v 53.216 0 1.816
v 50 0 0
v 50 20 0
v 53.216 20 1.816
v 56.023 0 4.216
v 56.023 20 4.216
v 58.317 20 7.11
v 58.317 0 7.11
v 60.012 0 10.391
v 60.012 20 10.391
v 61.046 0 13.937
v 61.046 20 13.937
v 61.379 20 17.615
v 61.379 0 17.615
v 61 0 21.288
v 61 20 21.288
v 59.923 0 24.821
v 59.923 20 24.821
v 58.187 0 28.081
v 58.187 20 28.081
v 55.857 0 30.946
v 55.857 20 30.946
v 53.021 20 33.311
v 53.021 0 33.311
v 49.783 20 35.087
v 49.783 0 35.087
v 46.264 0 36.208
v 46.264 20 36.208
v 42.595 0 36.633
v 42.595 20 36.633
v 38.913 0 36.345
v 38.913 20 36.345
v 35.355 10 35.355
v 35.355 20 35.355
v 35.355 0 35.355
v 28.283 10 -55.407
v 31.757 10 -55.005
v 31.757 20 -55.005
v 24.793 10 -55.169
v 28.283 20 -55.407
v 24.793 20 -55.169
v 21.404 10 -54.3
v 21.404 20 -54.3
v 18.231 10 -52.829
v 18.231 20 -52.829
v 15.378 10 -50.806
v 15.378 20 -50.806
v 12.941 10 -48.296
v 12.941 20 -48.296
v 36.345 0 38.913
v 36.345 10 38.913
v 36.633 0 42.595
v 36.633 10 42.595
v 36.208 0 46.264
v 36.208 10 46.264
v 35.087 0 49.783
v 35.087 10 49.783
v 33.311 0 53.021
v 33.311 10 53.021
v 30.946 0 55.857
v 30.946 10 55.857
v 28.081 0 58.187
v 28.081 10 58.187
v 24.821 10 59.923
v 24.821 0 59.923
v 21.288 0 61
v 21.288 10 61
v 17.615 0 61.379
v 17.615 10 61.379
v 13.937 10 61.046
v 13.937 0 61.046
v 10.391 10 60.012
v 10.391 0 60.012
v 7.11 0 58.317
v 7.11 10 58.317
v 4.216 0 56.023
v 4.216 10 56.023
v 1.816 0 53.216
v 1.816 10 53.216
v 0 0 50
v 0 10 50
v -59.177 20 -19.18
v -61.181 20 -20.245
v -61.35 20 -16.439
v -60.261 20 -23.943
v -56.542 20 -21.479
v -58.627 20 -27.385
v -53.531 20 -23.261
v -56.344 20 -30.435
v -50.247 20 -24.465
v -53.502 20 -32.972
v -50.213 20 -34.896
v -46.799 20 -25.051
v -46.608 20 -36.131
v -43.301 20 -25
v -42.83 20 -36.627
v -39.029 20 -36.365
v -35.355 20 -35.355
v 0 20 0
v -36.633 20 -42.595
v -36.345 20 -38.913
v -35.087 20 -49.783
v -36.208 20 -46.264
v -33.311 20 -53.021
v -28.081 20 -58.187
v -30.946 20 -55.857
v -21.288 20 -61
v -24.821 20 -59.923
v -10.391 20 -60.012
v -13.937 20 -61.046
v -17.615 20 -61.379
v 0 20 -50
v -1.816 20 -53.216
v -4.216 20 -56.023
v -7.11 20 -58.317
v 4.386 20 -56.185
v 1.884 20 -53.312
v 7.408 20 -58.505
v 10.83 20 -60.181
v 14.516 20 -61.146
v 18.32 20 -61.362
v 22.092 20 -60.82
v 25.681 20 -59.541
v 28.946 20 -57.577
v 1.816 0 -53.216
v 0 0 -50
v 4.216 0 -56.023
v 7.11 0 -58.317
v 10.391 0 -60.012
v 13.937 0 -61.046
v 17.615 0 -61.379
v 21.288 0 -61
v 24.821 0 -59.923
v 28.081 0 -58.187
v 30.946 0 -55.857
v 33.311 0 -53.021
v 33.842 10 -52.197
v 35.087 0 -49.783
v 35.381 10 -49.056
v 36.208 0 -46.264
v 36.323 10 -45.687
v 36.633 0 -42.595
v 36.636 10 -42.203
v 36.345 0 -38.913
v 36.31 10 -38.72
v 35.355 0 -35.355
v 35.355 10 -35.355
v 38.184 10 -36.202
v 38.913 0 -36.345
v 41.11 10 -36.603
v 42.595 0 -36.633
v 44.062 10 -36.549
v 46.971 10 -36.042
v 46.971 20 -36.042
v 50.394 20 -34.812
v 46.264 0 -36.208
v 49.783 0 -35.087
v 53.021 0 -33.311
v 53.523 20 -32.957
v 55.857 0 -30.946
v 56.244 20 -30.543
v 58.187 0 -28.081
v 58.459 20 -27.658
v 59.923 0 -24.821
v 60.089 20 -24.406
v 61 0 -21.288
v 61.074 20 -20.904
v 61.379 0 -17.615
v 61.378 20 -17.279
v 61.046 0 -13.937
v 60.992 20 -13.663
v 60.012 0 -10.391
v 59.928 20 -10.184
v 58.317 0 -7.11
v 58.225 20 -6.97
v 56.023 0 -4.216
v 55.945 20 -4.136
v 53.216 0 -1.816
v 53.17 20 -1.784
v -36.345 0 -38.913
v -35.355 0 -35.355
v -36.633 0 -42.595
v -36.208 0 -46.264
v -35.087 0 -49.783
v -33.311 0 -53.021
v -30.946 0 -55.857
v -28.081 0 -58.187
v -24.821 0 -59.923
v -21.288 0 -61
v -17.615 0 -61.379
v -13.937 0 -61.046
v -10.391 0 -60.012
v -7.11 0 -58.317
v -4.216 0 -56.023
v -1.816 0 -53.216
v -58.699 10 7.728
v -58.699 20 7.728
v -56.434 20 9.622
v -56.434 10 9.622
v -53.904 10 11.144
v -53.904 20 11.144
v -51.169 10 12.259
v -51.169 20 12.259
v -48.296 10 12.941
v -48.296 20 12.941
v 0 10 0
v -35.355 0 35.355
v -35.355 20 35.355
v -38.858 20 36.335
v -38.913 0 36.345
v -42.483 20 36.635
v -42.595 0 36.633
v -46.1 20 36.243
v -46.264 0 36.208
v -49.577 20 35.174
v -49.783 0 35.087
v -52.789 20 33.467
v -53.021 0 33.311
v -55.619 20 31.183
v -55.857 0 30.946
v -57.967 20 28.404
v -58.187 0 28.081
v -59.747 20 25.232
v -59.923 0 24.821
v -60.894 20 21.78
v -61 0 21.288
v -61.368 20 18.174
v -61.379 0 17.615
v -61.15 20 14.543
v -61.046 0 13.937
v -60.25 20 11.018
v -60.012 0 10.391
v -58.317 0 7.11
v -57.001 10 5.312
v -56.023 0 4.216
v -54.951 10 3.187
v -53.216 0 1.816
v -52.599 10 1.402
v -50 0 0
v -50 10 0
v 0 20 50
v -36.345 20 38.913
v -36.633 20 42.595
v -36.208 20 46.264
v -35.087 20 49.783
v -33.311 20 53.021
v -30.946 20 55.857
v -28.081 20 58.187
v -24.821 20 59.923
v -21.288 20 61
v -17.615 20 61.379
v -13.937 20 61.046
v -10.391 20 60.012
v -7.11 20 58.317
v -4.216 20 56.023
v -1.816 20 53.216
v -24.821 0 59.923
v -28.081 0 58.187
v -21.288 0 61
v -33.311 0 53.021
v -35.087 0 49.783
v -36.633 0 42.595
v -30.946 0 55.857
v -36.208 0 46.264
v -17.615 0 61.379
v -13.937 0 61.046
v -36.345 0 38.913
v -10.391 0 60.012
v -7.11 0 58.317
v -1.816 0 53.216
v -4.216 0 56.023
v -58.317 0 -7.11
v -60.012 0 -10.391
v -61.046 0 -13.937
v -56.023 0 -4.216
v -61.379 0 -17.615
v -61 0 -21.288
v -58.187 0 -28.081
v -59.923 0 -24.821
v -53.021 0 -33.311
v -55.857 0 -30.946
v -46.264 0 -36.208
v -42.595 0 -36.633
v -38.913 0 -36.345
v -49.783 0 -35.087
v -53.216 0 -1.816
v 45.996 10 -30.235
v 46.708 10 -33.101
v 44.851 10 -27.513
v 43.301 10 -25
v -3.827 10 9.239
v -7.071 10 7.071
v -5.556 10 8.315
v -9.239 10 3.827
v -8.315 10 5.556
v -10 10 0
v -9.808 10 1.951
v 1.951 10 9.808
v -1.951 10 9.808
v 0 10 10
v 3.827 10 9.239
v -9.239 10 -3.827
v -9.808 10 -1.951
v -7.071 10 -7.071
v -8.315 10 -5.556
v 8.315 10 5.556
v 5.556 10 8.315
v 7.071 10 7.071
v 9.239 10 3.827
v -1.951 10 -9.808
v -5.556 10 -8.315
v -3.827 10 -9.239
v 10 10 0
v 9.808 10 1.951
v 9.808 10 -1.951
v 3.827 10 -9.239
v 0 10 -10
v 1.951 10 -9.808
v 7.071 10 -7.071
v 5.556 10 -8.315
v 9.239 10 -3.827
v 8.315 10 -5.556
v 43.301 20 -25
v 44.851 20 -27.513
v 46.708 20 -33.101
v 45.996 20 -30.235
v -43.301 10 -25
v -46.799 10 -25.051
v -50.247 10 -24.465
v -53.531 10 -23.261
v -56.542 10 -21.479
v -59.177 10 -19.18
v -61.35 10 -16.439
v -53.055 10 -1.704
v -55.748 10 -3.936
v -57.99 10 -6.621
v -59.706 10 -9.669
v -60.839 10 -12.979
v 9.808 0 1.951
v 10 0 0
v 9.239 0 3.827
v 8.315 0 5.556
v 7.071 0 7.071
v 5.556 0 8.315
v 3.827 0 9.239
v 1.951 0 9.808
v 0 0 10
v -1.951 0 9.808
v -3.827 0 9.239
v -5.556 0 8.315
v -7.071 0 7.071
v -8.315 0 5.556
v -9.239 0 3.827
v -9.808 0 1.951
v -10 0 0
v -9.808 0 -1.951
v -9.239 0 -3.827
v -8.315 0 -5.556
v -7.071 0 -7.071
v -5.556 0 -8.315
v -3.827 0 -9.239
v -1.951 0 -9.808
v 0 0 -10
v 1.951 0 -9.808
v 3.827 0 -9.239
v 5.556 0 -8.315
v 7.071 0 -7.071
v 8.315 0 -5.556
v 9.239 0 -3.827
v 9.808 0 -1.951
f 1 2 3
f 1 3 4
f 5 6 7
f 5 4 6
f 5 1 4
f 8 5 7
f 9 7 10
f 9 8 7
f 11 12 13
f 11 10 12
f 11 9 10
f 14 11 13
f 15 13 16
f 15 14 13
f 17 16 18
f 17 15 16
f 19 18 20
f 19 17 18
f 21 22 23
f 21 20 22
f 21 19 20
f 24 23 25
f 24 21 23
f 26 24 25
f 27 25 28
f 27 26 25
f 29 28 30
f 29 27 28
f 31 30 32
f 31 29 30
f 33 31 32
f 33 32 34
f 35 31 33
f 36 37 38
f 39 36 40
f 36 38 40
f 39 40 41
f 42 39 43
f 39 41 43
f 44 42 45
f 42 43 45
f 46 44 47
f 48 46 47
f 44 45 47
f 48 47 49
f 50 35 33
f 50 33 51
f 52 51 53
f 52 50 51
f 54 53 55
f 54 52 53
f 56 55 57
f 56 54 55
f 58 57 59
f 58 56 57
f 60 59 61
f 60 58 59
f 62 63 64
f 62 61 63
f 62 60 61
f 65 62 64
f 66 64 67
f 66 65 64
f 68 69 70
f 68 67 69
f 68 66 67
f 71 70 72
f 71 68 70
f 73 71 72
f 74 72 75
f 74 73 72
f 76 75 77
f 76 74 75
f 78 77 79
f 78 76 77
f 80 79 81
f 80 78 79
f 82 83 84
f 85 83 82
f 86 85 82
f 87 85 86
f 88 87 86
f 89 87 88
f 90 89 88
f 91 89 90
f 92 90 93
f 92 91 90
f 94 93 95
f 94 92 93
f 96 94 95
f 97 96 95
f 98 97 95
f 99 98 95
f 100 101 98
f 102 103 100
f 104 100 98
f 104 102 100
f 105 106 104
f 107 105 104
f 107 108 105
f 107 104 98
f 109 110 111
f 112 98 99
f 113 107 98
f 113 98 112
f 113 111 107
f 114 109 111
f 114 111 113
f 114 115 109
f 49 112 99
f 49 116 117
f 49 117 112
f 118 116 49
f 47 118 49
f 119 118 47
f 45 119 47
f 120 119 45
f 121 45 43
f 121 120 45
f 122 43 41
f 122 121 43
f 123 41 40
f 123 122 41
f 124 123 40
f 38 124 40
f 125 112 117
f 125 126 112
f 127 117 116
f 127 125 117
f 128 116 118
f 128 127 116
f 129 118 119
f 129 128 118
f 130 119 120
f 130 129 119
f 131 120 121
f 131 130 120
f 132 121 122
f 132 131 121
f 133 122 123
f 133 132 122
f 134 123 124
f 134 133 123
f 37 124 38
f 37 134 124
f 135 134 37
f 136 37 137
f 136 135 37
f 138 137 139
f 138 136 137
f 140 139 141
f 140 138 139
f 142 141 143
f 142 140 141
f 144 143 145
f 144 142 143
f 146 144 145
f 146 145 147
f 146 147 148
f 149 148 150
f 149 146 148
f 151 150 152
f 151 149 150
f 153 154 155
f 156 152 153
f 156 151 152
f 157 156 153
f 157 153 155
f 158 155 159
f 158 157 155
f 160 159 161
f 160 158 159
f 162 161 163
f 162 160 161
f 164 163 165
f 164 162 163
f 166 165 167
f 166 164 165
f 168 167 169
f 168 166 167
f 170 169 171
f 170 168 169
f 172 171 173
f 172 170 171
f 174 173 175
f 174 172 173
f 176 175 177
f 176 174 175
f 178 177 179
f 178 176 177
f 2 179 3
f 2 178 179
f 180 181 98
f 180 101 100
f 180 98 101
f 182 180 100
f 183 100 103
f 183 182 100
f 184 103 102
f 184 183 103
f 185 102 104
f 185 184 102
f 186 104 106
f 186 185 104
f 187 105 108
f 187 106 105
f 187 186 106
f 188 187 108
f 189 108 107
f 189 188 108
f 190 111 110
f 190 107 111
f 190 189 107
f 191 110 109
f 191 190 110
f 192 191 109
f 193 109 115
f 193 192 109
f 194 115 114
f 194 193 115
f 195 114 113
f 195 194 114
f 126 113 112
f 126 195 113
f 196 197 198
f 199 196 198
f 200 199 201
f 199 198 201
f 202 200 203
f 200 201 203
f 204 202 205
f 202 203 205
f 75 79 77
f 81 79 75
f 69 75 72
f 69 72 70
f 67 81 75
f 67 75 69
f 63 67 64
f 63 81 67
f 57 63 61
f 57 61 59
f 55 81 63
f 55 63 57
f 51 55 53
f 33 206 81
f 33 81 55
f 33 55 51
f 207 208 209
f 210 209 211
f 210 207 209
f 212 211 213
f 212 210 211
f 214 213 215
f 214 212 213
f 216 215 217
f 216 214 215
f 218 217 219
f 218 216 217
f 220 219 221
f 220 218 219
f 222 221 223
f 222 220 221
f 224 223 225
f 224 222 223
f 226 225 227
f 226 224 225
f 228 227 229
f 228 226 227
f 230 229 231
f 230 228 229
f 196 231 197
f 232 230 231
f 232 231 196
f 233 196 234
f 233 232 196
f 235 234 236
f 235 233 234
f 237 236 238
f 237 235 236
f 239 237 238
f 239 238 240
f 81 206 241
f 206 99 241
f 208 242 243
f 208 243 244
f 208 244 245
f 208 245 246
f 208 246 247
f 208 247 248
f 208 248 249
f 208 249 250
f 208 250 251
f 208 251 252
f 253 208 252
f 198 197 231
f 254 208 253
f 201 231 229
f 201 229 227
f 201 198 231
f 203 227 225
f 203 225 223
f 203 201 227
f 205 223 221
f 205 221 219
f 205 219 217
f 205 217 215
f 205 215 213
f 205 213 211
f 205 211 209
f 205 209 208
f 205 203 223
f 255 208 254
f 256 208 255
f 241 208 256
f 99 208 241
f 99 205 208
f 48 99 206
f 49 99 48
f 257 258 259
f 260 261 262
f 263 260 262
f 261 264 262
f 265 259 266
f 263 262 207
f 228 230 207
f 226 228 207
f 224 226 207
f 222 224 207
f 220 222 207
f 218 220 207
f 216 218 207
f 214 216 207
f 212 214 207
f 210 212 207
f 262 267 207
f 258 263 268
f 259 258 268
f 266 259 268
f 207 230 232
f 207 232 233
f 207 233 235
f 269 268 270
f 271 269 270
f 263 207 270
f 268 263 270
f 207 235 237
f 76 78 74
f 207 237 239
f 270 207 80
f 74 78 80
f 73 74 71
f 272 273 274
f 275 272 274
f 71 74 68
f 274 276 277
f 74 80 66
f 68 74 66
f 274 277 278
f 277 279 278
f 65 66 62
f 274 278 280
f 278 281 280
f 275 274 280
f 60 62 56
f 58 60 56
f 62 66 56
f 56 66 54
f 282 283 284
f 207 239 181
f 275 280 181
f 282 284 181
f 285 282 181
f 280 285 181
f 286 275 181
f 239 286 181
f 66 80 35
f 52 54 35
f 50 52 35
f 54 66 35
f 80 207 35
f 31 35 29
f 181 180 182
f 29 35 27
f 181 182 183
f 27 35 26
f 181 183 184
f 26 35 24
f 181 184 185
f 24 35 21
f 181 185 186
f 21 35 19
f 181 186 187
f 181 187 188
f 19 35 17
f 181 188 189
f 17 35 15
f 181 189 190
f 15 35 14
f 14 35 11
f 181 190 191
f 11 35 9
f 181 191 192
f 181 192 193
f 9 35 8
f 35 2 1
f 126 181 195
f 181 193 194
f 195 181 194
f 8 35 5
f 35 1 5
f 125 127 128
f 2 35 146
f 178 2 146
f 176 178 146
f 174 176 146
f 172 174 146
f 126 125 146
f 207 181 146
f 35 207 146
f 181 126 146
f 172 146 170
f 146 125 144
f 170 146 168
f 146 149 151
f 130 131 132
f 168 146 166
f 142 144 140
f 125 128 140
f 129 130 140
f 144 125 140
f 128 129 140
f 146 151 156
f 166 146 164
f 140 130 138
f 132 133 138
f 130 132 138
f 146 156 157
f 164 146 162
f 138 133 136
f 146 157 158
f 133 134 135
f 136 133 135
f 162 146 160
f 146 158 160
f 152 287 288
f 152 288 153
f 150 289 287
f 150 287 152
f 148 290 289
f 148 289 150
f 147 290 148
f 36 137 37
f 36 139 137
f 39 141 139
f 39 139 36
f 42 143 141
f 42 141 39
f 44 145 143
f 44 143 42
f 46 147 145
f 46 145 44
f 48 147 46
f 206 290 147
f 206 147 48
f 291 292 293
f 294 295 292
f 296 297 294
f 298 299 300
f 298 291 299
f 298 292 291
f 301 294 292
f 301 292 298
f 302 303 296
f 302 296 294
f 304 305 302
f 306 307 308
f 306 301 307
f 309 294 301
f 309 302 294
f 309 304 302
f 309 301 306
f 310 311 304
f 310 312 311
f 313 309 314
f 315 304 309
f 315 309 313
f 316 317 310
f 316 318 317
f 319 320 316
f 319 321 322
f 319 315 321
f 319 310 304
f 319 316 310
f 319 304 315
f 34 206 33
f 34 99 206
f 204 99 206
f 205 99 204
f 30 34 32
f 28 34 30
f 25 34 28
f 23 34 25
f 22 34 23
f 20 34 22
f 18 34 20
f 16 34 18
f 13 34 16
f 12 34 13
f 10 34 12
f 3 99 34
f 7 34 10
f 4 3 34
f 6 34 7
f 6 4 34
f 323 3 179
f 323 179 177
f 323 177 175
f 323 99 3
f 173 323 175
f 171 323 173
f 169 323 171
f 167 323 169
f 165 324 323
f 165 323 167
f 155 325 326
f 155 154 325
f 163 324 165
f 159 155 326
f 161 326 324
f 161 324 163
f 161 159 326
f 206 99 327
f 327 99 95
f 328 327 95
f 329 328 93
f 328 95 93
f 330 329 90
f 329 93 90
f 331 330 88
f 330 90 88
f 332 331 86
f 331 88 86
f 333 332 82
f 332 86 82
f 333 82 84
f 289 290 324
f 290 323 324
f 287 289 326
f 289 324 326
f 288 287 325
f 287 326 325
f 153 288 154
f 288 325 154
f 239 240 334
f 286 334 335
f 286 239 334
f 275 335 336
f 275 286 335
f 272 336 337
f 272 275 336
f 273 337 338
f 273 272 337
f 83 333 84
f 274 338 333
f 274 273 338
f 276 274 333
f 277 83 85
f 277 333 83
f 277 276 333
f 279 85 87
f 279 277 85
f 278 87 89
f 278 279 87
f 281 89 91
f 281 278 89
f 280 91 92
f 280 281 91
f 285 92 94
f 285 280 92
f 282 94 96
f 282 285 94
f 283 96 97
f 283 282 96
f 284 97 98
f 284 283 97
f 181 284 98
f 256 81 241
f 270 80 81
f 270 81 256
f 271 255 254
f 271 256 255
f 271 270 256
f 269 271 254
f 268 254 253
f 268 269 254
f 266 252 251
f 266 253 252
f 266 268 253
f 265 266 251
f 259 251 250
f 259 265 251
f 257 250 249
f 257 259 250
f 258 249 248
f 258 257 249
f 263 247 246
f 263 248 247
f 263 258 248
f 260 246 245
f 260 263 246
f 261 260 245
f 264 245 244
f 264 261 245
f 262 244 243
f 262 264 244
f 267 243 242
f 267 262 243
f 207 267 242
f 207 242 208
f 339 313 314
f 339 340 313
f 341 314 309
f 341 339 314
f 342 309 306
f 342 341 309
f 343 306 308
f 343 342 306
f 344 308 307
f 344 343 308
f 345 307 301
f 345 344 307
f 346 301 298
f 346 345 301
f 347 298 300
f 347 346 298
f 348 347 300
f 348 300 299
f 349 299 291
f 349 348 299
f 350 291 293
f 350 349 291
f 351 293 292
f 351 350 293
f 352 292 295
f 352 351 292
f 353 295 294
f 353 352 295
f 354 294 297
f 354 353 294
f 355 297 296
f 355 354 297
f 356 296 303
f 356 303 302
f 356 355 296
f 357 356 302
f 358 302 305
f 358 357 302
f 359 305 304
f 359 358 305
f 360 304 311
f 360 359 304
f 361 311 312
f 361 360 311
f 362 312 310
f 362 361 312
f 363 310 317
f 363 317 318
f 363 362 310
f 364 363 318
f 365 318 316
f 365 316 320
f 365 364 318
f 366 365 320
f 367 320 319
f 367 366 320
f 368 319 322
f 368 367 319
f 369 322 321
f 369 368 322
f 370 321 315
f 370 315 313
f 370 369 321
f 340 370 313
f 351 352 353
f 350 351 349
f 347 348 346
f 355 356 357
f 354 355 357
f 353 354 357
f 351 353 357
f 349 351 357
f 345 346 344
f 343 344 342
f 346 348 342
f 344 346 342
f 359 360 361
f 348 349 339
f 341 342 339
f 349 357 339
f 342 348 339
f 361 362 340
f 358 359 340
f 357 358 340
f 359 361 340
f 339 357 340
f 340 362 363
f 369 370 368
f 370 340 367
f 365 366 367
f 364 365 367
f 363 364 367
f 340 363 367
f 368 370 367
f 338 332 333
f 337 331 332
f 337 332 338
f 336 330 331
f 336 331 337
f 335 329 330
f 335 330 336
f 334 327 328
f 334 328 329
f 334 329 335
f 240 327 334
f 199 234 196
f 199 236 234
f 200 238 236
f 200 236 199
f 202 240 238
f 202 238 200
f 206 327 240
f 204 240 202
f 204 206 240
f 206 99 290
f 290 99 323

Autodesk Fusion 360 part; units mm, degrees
sketch "Sketch1" plane through (0, 0, 0) normal (0, 1, 0) x (1, 0, 0)
  circle A0 centre (0, 0) radius 10
  circle A1 centre (0, 0) radius 50
  line L0 (0, 0) -> (50, 0) construction
  line L1 (-1.8153, 0) -> (-5, -5)
  line L2 (0, 0) -> (0, -50)
  line L3 (0, 0) -> (35.3553, -35.3553)
  arc A2 (0, -50) -> (35.3553, -35.3553) centre (17.4962, -42.2396) ccw
  arc A3 (35.3553, -35.3553) -> (50, 0) centre (42.2396, -17.4962) ccw
  arc A4 (50, 0) -> (35.3553, 35.3553) centre (42.2396, 17.4962) ccw
  arc A5 (35.3553, 35.3553) -> (0, 50) centre (17.4962, 42.2396) ccw
  arc A6 (0, 50) -> (-35.3553, 35.3553) centre (-17.4962, 42.2396) ccw
  arc A7 (-35.3553, 35.3553) -> (-50, 0) centre (-42.2396, 17.4962) ccw
  arc A8 (-50, 0) -> (-35.3553, -35.3553) centre (-42.2396, -17.4962) ccw
  arc A9 (-35.3553, -35.3553) -> (0, -50) centre (-17.4962, -42.2396) ccw
  dimension "d1" = 20
  dimension "d3" = 100
  dimension "d4" = 45
  dimension "d6" = 19.14
  dimension "d8" = 360
extrude "Extrude1" add sketch "Sketch1" along normal blind 20 makes body 1
extrude "Extrude2" cut sketch "Sketch1" against normal blind 10 from surface at 20 contours A0 L2 L3 | A0 A1 L2 L3 | A1 A2 picked at (2.9423, -5.9663) picked at (23.9603, -27.6522) bodies 1
pattern_circular "C-Pattern1" count 3 over 360 about axis through (0, 20, 0) along (0, -1, 0) of "Extrude2"
extrude "Extrude3" add sketch "Sketch1" along normal blind 10 separate body contours A0 L2 L3 | A0 L2 L3 makes body 2
